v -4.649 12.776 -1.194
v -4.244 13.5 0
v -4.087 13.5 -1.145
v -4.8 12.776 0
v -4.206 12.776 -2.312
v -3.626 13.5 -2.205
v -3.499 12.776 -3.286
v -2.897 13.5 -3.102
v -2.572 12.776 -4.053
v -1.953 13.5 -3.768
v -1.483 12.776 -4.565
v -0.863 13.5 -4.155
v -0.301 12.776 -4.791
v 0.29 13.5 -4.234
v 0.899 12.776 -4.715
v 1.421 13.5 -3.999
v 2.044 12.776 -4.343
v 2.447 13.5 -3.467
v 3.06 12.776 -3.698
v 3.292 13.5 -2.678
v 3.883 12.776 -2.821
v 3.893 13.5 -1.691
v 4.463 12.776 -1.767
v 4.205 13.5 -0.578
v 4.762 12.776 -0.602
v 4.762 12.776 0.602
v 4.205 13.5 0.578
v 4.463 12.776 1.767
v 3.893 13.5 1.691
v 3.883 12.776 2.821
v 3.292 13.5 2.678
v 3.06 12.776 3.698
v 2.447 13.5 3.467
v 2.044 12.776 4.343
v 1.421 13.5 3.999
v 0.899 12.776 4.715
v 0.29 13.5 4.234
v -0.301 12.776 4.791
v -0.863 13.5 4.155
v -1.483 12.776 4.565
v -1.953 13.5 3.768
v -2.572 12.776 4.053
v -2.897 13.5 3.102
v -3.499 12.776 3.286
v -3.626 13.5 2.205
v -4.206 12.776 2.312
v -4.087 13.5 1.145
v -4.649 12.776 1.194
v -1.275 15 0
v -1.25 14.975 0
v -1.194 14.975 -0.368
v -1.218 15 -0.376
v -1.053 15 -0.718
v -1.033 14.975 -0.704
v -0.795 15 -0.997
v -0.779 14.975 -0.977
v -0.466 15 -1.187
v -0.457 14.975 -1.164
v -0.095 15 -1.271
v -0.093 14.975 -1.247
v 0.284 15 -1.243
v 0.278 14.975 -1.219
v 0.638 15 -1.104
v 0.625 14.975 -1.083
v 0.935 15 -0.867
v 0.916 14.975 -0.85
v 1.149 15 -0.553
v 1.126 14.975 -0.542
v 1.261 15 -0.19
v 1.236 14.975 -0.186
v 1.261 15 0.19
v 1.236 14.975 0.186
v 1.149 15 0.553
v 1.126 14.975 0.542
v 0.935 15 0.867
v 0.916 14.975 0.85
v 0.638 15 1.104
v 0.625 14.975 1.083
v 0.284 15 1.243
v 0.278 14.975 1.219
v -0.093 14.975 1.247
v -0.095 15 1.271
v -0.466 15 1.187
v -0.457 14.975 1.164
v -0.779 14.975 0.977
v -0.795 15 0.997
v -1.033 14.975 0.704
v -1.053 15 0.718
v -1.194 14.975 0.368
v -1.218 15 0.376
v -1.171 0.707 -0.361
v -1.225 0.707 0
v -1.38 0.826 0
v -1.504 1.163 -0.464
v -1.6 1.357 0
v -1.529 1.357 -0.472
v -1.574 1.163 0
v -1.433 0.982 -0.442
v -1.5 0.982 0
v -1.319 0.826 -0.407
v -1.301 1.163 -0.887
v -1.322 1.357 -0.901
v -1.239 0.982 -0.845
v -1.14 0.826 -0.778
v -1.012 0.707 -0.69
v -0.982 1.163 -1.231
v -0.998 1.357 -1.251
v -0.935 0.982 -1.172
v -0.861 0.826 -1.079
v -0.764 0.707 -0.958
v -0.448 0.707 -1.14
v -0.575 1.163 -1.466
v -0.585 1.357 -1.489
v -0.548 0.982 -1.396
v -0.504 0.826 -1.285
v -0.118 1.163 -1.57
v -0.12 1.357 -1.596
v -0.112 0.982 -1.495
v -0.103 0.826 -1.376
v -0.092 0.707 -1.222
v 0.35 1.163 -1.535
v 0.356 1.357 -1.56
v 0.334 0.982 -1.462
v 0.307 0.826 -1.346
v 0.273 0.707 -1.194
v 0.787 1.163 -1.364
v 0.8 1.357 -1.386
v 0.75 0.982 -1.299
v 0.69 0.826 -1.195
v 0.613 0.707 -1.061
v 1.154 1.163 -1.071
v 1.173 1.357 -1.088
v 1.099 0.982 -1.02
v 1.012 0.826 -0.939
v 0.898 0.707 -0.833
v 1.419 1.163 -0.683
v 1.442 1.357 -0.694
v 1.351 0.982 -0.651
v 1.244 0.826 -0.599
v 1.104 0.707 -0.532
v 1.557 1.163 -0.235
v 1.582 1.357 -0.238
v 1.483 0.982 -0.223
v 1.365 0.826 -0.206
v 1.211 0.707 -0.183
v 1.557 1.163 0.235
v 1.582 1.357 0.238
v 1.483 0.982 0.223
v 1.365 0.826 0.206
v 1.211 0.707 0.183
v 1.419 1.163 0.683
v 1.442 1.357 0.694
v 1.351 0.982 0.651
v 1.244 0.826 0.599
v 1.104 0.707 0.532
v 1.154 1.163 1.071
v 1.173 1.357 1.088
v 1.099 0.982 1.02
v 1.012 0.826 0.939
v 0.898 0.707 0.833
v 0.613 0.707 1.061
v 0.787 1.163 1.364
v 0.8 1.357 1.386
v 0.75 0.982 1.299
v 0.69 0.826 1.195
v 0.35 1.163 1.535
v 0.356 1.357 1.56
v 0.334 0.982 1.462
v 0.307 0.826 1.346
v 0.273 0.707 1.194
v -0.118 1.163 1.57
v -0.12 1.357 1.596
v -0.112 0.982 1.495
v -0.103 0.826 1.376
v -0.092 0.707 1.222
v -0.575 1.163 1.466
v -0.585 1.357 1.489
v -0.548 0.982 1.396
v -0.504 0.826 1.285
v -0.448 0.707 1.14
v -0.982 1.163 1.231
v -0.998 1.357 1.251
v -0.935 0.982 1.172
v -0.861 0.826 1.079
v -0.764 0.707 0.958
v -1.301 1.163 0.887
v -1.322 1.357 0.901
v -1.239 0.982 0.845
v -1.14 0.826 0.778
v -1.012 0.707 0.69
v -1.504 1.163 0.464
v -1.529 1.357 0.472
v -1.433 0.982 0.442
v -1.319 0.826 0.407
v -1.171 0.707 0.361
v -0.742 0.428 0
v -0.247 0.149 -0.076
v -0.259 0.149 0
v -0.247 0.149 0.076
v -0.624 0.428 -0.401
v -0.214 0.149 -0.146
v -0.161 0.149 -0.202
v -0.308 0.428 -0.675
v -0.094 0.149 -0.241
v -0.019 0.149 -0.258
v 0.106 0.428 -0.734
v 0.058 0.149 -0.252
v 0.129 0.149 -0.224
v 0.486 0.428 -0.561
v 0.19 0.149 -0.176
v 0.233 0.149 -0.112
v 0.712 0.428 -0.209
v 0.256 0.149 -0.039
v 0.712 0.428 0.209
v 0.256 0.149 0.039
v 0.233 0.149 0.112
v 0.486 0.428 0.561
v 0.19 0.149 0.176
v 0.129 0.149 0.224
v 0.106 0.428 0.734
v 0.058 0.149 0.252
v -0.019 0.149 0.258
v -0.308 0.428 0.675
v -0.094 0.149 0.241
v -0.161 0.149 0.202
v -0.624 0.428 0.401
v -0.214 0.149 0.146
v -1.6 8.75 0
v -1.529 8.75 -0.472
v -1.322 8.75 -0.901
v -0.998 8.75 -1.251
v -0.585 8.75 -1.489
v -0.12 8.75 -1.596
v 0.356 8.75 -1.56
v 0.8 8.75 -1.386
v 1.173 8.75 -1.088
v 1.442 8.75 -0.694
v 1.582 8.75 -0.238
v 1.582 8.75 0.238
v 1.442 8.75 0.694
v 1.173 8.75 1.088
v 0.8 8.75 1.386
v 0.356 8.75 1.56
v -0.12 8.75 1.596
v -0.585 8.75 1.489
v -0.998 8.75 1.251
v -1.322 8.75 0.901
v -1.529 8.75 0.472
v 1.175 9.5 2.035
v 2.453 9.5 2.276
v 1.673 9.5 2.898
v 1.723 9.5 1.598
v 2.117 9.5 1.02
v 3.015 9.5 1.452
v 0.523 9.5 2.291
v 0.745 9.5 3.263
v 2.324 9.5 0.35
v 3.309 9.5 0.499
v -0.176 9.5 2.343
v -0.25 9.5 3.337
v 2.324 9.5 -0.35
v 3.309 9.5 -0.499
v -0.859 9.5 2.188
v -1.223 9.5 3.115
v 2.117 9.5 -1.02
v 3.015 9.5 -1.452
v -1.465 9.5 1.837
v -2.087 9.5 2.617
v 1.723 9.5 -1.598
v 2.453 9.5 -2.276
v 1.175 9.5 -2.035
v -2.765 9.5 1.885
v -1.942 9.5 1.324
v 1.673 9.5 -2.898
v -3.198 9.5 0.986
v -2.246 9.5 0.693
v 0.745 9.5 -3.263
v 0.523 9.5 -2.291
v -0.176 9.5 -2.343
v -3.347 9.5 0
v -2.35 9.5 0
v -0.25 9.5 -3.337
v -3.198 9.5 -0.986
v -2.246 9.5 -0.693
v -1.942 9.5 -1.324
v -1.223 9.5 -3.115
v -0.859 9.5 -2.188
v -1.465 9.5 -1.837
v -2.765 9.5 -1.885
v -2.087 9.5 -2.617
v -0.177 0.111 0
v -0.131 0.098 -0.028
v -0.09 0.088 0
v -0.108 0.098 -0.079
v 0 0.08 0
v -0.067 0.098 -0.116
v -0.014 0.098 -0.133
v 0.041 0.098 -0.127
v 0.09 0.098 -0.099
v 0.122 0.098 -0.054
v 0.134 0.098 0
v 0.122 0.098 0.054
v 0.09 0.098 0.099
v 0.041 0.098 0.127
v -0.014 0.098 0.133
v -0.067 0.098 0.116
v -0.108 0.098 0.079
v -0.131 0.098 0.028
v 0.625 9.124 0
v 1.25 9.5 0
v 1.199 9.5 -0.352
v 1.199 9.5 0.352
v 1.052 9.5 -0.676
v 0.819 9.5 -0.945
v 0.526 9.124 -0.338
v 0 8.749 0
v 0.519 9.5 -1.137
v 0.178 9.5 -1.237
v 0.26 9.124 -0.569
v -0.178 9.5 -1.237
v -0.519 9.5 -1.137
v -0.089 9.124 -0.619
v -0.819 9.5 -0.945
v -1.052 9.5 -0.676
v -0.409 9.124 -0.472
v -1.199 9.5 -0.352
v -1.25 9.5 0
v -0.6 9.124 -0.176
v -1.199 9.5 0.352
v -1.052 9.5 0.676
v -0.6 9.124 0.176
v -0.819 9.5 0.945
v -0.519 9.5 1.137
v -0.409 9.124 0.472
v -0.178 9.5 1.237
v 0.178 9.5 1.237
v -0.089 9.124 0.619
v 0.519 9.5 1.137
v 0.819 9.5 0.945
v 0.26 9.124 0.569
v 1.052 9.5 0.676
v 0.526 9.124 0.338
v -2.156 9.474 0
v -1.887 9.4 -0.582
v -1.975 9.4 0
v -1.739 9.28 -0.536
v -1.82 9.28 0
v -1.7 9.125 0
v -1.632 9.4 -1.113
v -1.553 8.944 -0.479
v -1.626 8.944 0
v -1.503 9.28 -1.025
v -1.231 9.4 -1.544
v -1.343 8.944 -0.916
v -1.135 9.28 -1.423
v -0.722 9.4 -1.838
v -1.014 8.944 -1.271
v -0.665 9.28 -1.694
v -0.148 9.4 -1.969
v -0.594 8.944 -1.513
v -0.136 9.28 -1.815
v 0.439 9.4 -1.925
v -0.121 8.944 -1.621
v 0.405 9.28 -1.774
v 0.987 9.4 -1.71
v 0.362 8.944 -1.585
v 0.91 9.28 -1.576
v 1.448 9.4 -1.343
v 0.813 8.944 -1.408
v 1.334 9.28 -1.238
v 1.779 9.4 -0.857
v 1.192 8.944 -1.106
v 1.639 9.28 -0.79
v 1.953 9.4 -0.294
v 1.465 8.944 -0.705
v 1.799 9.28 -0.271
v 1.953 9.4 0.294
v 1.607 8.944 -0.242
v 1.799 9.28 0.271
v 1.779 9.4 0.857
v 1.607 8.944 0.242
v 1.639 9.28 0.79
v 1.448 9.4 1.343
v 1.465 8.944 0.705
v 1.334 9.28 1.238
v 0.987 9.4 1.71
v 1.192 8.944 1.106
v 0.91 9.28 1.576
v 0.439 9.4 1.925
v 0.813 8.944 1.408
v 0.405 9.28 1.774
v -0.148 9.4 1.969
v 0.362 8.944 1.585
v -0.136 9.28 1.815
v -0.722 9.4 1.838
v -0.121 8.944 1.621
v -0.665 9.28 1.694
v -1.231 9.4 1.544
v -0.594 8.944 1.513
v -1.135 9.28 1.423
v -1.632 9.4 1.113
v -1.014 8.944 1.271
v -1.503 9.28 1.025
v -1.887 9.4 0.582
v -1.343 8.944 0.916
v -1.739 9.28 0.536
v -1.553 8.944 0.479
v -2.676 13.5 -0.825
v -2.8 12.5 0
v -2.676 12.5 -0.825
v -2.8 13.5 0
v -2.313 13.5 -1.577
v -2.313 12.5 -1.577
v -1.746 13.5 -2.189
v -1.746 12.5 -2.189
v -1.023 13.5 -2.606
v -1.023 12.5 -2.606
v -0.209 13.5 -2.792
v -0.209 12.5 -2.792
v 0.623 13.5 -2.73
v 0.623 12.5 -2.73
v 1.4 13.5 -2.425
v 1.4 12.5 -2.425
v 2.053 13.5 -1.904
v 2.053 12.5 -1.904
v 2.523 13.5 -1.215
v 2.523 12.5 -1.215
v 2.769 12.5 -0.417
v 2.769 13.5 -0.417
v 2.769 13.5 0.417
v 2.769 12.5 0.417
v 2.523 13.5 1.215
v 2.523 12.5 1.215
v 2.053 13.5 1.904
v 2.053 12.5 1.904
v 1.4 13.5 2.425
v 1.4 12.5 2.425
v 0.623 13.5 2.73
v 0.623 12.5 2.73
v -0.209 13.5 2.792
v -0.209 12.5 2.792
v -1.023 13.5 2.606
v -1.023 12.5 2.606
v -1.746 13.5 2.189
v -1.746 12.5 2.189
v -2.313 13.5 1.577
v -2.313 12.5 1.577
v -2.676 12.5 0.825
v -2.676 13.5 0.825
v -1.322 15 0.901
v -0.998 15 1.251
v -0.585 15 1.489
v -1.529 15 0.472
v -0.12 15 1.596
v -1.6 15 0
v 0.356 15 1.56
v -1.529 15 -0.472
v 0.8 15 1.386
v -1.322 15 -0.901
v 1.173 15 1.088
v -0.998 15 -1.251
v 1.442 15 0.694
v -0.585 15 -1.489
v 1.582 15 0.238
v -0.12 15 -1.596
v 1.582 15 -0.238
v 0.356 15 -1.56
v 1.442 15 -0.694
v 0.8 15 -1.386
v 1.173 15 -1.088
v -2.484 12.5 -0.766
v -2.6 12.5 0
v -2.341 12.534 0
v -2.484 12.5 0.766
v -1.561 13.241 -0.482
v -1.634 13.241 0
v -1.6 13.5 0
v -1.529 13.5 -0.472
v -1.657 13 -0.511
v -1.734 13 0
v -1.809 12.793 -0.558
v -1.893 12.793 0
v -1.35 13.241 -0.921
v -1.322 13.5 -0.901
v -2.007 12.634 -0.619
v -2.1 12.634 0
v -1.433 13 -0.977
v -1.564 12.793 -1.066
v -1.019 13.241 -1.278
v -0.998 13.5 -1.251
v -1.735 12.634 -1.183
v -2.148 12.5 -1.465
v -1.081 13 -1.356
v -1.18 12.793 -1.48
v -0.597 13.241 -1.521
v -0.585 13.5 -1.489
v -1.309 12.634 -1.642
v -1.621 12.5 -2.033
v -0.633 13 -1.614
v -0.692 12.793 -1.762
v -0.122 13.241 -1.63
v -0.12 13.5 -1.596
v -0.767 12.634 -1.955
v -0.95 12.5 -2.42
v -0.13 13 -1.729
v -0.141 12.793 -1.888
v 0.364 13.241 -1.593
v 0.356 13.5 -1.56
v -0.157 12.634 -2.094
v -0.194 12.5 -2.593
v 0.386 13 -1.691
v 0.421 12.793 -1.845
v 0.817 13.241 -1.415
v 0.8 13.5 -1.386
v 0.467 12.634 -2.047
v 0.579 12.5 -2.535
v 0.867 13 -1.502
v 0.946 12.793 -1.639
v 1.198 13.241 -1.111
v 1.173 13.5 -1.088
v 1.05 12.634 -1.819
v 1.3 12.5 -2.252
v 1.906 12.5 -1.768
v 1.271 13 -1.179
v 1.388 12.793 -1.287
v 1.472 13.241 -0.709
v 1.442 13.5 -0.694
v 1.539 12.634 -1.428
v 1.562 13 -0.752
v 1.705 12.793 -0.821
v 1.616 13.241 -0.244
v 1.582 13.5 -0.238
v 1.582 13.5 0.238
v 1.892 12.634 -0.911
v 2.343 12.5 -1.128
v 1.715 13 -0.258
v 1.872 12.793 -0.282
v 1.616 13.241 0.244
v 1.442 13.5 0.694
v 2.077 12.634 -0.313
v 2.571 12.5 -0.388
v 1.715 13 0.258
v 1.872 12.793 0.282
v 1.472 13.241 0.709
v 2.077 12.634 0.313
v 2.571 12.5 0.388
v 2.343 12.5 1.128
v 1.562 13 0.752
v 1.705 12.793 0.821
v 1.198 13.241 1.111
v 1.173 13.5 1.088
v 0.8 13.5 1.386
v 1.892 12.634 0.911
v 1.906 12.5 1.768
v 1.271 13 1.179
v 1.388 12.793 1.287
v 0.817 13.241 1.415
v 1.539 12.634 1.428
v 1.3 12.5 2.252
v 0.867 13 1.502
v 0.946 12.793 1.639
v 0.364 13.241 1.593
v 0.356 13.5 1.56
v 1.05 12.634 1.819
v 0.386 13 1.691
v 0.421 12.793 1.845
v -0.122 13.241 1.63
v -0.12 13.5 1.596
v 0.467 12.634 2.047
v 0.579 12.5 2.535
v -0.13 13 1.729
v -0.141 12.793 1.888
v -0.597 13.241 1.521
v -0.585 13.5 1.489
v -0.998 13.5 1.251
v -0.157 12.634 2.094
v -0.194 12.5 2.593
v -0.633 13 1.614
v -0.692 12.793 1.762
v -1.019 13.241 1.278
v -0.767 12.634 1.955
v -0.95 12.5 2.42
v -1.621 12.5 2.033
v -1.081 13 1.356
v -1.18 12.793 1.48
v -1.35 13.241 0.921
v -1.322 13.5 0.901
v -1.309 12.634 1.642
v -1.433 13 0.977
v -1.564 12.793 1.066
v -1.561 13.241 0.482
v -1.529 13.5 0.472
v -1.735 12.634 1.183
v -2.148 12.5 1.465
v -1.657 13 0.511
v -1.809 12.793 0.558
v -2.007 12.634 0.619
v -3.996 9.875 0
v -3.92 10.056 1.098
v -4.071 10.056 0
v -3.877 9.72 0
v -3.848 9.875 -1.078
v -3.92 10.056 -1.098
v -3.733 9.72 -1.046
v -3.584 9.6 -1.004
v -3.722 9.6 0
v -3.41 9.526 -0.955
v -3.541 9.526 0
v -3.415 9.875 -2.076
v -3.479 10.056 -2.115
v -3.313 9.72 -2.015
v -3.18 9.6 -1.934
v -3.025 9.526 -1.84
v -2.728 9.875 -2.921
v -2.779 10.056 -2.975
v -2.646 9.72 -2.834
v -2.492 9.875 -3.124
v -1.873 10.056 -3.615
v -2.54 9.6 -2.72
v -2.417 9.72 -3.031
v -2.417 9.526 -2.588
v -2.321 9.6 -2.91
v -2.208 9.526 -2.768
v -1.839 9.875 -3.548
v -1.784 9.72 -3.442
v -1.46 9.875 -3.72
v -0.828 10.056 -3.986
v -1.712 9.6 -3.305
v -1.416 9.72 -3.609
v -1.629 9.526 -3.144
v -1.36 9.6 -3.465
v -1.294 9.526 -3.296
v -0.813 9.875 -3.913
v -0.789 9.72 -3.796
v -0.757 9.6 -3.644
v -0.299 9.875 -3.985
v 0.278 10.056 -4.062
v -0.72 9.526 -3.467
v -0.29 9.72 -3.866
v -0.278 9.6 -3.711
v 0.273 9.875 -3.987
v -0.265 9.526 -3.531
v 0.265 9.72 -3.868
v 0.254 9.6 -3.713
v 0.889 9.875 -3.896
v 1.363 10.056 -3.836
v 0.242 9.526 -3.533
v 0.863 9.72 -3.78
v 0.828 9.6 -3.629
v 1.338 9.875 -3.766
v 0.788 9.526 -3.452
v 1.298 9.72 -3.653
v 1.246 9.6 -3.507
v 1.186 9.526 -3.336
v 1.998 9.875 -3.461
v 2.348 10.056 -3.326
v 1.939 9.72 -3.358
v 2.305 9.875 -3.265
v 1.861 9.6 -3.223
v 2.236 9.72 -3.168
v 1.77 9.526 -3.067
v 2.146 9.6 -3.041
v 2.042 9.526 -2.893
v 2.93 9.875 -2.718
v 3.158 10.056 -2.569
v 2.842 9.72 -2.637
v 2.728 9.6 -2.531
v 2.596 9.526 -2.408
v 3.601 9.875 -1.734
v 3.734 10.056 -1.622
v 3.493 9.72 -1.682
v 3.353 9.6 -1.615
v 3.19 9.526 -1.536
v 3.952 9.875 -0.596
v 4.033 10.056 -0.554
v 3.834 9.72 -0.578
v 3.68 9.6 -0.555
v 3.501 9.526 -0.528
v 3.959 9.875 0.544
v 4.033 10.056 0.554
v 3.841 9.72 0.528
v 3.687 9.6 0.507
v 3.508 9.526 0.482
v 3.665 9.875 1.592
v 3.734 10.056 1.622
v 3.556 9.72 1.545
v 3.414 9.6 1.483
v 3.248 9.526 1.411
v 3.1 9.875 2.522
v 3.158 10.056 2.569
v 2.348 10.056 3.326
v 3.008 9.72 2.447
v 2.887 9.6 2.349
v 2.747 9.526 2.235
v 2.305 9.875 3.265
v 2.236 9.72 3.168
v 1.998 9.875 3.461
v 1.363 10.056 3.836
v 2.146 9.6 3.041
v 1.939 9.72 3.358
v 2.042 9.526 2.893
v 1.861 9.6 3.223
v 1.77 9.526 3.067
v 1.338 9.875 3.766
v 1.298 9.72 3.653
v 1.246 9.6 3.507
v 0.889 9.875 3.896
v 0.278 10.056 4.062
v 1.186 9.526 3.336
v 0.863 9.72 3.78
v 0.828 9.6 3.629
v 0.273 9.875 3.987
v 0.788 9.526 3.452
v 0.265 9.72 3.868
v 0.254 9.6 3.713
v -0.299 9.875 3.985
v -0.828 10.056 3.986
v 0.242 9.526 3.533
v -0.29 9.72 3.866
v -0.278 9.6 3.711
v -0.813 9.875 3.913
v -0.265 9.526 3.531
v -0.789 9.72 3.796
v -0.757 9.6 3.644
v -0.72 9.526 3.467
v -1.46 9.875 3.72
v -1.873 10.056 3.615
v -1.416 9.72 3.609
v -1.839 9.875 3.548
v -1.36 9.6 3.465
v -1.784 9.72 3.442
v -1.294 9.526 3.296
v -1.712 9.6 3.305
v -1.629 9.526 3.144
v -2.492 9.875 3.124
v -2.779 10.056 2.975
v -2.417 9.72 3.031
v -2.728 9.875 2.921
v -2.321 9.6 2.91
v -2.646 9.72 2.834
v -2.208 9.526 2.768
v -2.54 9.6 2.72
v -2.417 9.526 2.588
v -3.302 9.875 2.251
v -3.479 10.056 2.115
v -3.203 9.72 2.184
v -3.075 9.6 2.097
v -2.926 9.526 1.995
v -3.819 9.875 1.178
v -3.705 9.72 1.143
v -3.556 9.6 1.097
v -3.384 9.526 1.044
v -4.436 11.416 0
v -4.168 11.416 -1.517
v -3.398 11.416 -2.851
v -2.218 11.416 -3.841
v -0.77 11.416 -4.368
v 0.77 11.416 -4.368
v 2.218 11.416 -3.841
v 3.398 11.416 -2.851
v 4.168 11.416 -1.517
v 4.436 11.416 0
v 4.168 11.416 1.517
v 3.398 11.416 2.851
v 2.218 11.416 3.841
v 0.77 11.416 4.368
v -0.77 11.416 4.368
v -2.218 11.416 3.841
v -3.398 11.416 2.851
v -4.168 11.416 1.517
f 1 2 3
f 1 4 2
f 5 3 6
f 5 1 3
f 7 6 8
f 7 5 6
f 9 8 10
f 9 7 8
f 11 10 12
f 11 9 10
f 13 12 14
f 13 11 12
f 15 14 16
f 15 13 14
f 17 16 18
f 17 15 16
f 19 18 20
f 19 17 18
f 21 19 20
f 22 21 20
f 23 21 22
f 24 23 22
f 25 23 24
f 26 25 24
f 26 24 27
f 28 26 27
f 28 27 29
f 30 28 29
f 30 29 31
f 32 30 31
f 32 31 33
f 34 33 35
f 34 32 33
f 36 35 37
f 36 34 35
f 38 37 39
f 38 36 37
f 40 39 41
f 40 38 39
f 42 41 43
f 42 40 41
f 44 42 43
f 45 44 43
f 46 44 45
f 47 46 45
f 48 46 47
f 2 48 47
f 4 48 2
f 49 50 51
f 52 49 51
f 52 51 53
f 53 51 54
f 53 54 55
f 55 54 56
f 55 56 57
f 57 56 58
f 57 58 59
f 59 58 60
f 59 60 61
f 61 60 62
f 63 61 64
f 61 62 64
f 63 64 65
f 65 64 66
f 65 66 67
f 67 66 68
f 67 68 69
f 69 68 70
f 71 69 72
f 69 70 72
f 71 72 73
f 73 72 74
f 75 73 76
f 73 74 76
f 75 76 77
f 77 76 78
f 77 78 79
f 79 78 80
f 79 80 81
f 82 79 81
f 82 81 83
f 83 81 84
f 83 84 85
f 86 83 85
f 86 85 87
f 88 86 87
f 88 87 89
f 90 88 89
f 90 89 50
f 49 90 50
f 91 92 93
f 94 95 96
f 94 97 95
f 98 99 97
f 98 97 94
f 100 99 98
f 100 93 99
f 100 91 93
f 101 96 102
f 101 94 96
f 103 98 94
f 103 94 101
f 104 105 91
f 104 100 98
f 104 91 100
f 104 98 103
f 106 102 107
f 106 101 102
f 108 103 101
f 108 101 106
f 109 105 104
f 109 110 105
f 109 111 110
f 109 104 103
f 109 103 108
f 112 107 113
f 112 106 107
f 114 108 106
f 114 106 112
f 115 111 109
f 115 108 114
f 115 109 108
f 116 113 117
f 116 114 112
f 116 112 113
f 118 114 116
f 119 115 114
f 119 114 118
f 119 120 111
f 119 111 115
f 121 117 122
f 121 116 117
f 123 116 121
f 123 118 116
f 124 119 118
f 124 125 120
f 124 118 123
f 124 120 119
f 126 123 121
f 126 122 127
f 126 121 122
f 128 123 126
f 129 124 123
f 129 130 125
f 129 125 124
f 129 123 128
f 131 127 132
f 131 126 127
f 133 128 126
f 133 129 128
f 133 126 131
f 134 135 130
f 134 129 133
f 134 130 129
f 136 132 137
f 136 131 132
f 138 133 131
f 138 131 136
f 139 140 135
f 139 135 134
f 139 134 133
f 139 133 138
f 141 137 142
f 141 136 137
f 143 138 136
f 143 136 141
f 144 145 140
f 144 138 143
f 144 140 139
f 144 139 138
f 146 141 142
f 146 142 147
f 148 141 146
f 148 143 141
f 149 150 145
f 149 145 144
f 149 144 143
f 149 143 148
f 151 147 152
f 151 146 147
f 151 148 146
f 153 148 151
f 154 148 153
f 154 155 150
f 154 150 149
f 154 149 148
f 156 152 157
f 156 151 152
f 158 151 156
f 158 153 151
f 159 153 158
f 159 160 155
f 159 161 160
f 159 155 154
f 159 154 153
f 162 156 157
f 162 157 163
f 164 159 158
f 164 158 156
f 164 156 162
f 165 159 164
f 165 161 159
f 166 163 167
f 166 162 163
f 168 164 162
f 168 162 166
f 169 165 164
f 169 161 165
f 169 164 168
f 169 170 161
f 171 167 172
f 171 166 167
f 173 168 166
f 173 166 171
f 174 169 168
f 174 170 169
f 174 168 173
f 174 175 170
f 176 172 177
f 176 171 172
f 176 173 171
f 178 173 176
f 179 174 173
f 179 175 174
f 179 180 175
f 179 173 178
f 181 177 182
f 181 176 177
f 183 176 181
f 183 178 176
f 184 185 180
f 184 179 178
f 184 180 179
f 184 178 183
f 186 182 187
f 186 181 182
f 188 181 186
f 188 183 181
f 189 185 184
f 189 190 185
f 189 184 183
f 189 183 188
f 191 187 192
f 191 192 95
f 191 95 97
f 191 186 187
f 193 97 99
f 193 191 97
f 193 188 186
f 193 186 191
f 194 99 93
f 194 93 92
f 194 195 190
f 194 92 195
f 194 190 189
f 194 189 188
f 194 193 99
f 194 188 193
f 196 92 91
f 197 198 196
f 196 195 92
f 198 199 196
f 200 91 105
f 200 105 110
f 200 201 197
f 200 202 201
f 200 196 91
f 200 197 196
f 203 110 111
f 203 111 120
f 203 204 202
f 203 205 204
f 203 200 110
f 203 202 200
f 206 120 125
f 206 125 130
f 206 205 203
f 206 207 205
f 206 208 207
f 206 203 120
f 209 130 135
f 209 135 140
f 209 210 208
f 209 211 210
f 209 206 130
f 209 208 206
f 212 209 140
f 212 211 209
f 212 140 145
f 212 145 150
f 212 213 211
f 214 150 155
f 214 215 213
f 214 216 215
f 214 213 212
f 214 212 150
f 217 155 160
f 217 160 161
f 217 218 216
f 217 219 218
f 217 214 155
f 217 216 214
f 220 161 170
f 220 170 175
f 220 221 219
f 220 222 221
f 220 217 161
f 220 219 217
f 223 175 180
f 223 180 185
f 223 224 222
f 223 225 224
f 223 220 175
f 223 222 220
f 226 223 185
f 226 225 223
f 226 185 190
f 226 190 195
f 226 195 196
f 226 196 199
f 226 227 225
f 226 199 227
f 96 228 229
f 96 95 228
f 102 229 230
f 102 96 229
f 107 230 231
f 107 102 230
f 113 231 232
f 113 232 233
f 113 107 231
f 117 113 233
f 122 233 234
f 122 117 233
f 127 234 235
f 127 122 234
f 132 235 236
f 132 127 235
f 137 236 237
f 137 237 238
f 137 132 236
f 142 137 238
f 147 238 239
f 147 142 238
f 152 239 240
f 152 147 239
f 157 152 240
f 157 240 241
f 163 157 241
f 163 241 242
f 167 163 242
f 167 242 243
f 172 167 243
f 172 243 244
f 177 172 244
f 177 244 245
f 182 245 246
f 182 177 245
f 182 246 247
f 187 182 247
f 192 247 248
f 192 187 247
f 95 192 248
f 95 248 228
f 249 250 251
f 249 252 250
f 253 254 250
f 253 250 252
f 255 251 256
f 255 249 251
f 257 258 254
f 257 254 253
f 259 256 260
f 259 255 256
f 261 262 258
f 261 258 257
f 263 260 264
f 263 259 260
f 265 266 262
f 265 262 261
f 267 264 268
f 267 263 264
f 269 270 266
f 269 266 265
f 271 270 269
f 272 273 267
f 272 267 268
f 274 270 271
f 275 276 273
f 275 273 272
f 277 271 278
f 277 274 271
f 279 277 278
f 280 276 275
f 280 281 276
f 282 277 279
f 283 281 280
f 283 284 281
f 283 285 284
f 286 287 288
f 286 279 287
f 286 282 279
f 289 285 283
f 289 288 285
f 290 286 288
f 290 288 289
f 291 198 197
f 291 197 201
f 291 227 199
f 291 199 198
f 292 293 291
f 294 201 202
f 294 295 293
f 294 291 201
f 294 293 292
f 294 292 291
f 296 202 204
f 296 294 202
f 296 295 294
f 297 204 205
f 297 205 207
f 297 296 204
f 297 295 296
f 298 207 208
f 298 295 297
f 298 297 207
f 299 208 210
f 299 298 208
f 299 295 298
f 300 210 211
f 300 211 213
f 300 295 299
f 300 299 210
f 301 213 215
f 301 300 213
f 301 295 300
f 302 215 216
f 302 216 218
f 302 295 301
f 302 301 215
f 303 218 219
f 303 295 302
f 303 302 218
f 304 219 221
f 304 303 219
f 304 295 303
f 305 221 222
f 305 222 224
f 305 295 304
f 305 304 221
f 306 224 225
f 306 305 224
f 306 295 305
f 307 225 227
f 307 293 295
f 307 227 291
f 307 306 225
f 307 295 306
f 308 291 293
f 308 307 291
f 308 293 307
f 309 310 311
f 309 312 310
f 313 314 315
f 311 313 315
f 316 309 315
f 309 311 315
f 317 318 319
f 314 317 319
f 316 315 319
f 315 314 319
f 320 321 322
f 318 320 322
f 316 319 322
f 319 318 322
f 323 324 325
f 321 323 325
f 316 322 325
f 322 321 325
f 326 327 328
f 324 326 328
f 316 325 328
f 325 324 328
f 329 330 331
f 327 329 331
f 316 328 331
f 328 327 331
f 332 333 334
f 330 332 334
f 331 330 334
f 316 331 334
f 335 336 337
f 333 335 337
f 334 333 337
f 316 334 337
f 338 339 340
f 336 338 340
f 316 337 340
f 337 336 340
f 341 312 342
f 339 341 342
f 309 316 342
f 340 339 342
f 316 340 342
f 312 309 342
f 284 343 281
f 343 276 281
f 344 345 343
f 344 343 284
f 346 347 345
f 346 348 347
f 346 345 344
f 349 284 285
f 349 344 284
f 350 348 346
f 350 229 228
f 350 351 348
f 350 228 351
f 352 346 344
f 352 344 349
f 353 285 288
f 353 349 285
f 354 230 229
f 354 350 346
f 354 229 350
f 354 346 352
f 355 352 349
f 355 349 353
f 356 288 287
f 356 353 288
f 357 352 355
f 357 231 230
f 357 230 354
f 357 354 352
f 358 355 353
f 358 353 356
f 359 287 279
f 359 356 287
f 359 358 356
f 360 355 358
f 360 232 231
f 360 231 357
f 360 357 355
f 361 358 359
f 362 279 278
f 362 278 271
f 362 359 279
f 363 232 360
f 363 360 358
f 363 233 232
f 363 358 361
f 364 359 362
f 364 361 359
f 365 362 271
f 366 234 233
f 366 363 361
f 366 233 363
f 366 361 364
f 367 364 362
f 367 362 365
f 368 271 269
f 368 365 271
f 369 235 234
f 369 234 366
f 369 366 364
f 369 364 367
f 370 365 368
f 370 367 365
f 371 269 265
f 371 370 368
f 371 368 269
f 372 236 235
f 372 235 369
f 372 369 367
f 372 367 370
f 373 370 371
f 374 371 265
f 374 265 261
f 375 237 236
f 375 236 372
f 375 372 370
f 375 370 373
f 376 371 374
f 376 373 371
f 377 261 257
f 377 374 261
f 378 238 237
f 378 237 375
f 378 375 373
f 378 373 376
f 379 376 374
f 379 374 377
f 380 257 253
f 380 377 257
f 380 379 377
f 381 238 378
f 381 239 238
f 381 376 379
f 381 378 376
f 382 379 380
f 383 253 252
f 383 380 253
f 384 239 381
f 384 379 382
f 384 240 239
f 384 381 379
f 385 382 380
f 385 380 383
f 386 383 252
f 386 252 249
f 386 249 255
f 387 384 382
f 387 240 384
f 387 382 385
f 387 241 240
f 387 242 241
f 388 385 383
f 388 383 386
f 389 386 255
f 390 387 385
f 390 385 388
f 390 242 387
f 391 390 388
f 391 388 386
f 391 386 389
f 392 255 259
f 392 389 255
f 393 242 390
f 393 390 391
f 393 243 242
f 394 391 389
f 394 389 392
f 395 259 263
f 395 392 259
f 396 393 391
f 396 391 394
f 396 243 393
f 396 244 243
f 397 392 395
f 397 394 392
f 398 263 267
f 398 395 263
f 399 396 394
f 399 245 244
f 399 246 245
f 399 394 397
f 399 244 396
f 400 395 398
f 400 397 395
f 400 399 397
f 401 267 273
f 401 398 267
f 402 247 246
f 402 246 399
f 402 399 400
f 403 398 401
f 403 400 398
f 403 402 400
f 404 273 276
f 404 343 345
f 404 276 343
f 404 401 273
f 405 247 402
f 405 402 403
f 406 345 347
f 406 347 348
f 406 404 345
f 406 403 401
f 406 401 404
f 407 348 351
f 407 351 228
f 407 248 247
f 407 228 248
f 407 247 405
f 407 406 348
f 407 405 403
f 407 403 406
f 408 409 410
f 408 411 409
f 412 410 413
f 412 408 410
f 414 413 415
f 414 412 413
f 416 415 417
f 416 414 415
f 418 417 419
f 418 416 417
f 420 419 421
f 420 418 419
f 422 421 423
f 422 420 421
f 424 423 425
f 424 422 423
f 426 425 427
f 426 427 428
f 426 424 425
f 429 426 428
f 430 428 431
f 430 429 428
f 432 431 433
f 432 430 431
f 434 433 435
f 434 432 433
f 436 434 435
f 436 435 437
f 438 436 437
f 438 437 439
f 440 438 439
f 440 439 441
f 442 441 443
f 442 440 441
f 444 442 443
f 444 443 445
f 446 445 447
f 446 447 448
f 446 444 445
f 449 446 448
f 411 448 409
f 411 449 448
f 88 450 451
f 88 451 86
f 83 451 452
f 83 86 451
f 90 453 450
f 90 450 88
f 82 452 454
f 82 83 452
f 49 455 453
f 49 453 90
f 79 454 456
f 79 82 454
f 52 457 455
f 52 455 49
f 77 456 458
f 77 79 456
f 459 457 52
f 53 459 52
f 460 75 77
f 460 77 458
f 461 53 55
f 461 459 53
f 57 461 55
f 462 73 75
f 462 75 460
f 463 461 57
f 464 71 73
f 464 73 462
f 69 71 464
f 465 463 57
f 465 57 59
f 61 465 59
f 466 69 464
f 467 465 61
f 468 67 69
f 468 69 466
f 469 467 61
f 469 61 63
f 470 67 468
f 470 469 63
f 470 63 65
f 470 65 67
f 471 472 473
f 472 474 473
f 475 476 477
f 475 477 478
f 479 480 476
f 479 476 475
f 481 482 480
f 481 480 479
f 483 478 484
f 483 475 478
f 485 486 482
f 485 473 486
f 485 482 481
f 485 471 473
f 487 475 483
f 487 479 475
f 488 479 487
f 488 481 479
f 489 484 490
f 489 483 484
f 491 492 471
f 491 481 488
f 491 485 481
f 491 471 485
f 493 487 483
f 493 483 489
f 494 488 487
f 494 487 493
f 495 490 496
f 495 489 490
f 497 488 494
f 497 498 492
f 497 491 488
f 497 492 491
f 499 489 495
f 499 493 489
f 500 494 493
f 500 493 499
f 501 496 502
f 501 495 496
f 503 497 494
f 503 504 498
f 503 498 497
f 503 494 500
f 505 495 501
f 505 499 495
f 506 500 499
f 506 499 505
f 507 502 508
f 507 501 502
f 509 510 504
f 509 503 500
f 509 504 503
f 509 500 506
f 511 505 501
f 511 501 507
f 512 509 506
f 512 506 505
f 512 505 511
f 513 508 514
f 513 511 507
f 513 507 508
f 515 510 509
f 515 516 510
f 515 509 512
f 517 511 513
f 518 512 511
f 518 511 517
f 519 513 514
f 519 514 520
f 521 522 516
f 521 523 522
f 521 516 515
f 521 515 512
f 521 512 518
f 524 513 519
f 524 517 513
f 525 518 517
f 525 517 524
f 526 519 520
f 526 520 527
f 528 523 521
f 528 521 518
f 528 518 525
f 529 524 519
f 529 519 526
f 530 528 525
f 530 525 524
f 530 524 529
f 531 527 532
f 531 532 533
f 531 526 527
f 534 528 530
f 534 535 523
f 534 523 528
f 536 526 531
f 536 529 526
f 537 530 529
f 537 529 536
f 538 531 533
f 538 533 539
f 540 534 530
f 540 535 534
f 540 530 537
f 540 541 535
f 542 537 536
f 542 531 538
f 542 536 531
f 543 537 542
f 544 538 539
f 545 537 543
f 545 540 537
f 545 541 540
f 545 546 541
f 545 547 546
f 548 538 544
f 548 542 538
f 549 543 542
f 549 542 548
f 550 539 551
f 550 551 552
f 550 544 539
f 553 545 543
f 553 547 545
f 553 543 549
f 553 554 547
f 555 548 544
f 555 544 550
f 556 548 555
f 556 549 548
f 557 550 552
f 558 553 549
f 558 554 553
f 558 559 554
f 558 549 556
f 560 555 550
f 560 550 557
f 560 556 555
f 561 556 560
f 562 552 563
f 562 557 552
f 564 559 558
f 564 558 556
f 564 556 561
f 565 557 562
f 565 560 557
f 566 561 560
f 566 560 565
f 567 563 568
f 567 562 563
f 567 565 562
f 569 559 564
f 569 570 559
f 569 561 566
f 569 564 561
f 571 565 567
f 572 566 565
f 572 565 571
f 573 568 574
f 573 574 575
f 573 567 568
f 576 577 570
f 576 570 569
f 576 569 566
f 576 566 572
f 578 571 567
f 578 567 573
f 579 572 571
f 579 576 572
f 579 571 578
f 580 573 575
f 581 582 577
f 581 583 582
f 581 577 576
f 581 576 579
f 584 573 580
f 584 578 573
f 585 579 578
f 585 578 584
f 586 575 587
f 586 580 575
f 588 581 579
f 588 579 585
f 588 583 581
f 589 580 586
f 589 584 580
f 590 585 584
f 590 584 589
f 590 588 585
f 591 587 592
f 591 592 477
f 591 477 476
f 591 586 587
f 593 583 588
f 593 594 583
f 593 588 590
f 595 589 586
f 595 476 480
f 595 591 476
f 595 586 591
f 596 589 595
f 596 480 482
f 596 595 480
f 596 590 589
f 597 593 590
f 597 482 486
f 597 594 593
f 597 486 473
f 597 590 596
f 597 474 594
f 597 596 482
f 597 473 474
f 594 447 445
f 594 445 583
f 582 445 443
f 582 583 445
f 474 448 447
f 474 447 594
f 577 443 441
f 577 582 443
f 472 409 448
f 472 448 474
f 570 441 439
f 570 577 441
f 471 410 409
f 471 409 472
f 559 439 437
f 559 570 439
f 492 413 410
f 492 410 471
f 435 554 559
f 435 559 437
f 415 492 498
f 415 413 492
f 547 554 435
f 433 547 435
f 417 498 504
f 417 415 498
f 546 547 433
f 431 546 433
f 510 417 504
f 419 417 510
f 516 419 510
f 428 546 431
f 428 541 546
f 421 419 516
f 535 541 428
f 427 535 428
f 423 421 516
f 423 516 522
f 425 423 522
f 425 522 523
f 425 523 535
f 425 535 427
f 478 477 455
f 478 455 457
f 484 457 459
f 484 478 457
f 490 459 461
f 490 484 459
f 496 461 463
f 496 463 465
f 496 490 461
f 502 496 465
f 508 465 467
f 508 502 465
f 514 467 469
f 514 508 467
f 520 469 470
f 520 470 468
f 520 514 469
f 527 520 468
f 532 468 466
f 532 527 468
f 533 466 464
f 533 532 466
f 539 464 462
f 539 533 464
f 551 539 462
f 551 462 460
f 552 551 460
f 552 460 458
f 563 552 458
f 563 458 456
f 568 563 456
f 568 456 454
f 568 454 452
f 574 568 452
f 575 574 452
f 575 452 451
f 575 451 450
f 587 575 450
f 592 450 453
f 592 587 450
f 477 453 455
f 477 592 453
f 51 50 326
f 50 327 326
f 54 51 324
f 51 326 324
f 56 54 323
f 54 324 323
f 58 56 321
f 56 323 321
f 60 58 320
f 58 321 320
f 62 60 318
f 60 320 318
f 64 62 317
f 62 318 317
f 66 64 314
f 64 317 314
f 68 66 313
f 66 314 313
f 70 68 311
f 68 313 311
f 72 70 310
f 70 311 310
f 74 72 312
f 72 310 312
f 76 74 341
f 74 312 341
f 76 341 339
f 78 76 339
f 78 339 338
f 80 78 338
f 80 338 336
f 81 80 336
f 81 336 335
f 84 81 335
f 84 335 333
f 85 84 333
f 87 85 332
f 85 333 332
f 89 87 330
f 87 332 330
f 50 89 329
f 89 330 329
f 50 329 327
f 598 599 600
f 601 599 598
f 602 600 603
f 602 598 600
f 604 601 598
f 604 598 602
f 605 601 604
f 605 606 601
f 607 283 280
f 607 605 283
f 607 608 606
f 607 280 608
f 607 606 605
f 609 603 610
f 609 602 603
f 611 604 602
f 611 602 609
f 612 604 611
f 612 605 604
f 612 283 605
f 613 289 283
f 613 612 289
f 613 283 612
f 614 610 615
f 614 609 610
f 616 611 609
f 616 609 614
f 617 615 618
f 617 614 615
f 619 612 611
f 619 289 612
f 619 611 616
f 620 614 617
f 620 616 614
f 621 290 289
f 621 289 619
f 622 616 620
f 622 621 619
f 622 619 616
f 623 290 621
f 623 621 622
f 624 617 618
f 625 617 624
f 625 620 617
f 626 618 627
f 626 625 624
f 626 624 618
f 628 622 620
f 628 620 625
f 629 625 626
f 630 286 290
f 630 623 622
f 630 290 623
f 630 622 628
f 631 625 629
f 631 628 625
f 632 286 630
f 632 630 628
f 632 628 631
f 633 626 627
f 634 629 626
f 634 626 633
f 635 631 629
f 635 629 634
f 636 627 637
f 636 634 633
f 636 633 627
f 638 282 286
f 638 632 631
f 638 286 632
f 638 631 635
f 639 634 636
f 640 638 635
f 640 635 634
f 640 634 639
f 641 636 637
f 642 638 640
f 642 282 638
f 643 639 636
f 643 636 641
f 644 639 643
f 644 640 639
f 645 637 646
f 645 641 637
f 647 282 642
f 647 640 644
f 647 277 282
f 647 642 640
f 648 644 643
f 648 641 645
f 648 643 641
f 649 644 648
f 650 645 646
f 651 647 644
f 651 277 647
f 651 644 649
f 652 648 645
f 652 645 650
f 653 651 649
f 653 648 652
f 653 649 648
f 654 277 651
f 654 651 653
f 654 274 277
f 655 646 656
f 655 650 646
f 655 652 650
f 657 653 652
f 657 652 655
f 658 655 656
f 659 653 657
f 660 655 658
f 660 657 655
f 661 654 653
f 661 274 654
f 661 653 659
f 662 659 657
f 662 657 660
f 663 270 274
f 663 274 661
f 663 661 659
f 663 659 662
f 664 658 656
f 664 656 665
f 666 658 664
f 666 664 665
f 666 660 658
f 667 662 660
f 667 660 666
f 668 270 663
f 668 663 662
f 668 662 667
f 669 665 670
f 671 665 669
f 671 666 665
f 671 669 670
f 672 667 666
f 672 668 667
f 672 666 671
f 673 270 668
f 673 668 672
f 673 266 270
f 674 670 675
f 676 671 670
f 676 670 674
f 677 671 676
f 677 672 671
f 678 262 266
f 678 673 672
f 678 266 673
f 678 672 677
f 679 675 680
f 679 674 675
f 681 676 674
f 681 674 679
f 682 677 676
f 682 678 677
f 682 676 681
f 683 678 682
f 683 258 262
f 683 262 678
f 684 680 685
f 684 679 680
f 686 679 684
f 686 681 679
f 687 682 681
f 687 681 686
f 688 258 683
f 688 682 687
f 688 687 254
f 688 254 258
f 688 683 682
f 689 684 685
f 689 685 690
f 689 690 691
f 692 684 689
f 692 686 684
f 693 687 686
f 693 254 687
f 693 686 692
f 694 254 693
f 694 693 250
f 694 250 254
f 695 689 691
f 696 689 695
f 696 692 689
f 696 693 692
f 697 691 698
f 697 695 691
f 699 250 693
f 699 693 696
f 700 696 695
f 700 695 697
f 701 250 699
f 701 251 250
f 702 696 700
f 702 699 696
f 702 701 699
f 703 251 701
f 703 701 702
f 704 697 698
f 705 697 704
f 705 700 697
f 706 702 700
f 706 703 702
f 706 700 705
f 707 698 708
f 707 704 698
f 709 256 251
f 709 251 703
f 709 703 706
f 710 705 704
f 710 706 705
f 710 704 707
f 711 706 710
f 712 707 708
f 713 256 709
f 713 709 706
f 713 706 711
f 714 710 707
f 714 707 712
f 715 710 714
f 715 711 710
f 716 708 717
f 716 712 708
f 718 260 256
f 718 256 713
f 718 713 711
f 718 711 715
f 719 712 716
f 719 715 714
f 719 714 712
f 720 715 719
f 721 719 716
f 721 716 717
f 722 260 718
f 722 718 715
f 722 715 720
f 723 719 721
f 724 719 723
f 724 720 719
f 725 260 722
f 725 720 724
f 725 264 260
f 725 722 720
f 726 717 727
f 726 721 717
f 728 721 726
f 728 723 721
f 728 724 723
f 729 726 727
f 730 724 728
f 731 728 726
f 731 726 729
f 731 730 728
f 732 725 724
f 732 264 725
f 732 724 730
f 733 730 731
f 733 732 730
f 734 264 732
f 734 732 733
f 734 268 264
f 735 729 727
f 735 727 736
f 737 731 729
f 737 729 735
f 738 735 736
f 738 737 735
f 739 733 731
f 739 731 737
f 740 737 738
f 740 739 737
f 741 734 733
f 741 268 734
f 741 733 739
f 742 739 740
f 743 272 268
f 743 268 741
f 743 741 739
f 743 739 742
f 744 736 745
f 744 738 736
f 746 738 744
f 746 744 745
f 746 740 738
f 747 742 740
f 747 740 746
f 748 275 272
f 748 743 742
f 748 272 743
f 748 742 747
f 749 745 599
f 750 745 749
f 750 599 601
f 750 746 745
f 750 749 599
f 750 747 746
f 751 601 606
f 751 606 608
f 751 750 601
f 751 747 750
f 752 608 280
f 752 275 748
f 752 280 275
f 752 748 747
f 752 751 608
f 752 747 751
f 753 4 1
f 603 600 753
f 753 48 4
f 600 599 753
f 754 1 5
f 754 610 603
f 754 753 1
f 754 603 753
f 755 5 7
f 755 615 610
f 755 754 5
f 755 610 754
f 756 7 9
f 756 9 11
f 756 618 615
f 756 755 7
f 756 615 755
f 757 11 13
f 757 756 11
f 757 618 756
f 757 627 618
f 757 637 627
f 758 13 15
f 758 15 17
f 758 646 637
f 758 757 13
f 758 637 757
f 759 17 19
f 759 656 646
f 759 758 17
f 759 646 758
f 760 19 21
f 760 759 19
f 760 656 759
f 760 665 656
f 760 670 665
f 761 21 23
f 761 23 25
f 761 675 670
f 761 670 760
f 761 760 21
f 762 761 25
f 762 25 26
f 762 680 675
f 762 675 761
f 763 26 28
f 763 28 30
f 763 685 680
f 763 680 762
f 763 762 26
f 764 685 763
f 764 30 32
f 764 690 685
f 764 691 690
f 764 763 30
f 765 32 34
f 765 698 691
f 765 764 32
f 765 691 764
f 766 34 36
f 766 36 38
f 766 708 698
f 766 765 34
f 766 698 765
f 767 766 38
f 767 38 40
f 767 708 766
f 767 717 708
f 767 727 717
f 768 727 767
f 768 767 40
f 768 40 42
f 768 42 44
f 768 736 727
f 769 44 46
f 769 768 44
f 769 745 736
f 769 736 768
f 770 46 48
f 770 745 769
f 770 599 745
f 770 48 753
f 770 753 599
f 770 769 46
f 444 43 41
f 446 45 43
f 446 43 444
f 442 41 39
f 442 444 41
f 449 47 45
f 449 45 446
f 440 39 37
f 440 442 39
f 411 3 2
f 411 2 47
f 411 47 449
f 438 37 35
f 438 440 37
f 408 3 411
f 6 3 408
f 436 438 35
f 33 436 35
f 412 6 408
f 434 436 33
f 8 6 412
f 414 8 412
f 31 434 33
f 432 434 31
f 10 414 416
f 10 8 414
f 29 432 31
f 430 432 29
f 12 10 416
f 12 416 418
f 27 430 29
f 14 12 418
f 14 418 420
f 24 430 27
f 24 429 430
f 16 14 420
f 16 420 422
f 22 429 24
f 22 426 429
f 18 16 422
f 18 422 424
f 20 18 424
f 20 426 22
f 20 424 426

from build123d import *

# Parameters (mm, degrees)
FILLET1_R                       = 1
F_2_5MM_DOWEL_HOLE1_D           = 2.5
F_2_5MM_DOWEL_HOLE1_DEPTH       = 5.5
F_2_5MM_DOWEL_HOLE1_CSINK_D     = 2.55
F_2_5MM_DOWEL_HOLE1_CSINK_ANGLE = 90
F_2_5MM_DOWEL_HOLE1_TIP         = 0.751075774


with BuildPart() as part:
    # Sketch1 → Revolve1 (revolve)
    with BuildSketch(Plane.XY, mode=Mode.PRIVATE) as revolve1_sk:
        with BuildLine():
            Line((1.6, 15), (1.6, 12.5))
            Line((1.6, 12.5), (2.8, 12.5))
            Line((2.8, 12.5), (2.8, 13.5))
            Line((2.8, 13.5), (4.244114284, 13.5))
            Line((4.244114284, 13.5), (4.8, 12.77555563))
            Line((4.8, 12.77555563), (4.071266643, 10.055885716))
            ThreePointArc((4.071266643, 10.055885716), (3.803393345, 9.654984995), (3.346822273, 9.5))
            Line((3.346822273, 9.5), (2.35, 9.5))
            ThreePointArc((2.35, 9.5), (1.819669914, 9.280330086), (1.6, 8.75))
            Line((1.6, 8.75), (1.6, 1.356773133))
            ThreePointArc((1.6, 1.356773133), (1.499519053, 0.981773133), (1.225, 0.70725408))
            Line((1.225, 0.70725408), (0.258564065, 0.149282032))
            ThreePointArc((0.258564065, 0.149282032), (0.133842609, 0.097620714), (0, 0.08))
            Line((0, 0.08), (0, 15))
            Line((0, 15), (1.6, 15))
        make_face()
    revolve(revolve1_sk.sketch.rotate(Axis((0, 17.798555487, 0), (0, -1, 0)), 180), axis=Axis((0, 17.798555487, 0), (0, -1, 0)))

    # Fillet1
    fillet1_edges = [part.edges().sort_by_distance(p)[0] for p in [
        (1.6, 12.5, 0),
    ]]
    fillet(fillet1_edges, radius=FILLET1_R)

    # Ø2.5mm Dowel Hole1
    with Locations(Plane(origin=(0, 15, 0), x_dir=(1, 0, 0), z_dir=(0, 1, 0))):
        with Locations((0, 0)):
            CounterSinkHole(F_2_5MM_DOWEL_HOLE1_D / 2, F_2_5MM_DOWEL_HOLE1_CSINK_D / 2, depth=F_2_5MM_DOWEL_HOLE1_DEPTH, counter_sink_angle=F_2_5MM_DOWEL_HOLE1_CSINK_ANGLE)
            with Locations((0, 0, -(F_2_5MM_DOWEL_HOLE1_DEPTH + F_2_5MM_DOWEL_HOLE1_TIP / 2))):  # 118° drill point
                Cone(0, F_2_5MM_DOWEL_HOLE1_D / 2, F_2_5MM_DOWEL_HOLE1_TIP, mode=Mode.SUBTRACT)


solid = part.part
